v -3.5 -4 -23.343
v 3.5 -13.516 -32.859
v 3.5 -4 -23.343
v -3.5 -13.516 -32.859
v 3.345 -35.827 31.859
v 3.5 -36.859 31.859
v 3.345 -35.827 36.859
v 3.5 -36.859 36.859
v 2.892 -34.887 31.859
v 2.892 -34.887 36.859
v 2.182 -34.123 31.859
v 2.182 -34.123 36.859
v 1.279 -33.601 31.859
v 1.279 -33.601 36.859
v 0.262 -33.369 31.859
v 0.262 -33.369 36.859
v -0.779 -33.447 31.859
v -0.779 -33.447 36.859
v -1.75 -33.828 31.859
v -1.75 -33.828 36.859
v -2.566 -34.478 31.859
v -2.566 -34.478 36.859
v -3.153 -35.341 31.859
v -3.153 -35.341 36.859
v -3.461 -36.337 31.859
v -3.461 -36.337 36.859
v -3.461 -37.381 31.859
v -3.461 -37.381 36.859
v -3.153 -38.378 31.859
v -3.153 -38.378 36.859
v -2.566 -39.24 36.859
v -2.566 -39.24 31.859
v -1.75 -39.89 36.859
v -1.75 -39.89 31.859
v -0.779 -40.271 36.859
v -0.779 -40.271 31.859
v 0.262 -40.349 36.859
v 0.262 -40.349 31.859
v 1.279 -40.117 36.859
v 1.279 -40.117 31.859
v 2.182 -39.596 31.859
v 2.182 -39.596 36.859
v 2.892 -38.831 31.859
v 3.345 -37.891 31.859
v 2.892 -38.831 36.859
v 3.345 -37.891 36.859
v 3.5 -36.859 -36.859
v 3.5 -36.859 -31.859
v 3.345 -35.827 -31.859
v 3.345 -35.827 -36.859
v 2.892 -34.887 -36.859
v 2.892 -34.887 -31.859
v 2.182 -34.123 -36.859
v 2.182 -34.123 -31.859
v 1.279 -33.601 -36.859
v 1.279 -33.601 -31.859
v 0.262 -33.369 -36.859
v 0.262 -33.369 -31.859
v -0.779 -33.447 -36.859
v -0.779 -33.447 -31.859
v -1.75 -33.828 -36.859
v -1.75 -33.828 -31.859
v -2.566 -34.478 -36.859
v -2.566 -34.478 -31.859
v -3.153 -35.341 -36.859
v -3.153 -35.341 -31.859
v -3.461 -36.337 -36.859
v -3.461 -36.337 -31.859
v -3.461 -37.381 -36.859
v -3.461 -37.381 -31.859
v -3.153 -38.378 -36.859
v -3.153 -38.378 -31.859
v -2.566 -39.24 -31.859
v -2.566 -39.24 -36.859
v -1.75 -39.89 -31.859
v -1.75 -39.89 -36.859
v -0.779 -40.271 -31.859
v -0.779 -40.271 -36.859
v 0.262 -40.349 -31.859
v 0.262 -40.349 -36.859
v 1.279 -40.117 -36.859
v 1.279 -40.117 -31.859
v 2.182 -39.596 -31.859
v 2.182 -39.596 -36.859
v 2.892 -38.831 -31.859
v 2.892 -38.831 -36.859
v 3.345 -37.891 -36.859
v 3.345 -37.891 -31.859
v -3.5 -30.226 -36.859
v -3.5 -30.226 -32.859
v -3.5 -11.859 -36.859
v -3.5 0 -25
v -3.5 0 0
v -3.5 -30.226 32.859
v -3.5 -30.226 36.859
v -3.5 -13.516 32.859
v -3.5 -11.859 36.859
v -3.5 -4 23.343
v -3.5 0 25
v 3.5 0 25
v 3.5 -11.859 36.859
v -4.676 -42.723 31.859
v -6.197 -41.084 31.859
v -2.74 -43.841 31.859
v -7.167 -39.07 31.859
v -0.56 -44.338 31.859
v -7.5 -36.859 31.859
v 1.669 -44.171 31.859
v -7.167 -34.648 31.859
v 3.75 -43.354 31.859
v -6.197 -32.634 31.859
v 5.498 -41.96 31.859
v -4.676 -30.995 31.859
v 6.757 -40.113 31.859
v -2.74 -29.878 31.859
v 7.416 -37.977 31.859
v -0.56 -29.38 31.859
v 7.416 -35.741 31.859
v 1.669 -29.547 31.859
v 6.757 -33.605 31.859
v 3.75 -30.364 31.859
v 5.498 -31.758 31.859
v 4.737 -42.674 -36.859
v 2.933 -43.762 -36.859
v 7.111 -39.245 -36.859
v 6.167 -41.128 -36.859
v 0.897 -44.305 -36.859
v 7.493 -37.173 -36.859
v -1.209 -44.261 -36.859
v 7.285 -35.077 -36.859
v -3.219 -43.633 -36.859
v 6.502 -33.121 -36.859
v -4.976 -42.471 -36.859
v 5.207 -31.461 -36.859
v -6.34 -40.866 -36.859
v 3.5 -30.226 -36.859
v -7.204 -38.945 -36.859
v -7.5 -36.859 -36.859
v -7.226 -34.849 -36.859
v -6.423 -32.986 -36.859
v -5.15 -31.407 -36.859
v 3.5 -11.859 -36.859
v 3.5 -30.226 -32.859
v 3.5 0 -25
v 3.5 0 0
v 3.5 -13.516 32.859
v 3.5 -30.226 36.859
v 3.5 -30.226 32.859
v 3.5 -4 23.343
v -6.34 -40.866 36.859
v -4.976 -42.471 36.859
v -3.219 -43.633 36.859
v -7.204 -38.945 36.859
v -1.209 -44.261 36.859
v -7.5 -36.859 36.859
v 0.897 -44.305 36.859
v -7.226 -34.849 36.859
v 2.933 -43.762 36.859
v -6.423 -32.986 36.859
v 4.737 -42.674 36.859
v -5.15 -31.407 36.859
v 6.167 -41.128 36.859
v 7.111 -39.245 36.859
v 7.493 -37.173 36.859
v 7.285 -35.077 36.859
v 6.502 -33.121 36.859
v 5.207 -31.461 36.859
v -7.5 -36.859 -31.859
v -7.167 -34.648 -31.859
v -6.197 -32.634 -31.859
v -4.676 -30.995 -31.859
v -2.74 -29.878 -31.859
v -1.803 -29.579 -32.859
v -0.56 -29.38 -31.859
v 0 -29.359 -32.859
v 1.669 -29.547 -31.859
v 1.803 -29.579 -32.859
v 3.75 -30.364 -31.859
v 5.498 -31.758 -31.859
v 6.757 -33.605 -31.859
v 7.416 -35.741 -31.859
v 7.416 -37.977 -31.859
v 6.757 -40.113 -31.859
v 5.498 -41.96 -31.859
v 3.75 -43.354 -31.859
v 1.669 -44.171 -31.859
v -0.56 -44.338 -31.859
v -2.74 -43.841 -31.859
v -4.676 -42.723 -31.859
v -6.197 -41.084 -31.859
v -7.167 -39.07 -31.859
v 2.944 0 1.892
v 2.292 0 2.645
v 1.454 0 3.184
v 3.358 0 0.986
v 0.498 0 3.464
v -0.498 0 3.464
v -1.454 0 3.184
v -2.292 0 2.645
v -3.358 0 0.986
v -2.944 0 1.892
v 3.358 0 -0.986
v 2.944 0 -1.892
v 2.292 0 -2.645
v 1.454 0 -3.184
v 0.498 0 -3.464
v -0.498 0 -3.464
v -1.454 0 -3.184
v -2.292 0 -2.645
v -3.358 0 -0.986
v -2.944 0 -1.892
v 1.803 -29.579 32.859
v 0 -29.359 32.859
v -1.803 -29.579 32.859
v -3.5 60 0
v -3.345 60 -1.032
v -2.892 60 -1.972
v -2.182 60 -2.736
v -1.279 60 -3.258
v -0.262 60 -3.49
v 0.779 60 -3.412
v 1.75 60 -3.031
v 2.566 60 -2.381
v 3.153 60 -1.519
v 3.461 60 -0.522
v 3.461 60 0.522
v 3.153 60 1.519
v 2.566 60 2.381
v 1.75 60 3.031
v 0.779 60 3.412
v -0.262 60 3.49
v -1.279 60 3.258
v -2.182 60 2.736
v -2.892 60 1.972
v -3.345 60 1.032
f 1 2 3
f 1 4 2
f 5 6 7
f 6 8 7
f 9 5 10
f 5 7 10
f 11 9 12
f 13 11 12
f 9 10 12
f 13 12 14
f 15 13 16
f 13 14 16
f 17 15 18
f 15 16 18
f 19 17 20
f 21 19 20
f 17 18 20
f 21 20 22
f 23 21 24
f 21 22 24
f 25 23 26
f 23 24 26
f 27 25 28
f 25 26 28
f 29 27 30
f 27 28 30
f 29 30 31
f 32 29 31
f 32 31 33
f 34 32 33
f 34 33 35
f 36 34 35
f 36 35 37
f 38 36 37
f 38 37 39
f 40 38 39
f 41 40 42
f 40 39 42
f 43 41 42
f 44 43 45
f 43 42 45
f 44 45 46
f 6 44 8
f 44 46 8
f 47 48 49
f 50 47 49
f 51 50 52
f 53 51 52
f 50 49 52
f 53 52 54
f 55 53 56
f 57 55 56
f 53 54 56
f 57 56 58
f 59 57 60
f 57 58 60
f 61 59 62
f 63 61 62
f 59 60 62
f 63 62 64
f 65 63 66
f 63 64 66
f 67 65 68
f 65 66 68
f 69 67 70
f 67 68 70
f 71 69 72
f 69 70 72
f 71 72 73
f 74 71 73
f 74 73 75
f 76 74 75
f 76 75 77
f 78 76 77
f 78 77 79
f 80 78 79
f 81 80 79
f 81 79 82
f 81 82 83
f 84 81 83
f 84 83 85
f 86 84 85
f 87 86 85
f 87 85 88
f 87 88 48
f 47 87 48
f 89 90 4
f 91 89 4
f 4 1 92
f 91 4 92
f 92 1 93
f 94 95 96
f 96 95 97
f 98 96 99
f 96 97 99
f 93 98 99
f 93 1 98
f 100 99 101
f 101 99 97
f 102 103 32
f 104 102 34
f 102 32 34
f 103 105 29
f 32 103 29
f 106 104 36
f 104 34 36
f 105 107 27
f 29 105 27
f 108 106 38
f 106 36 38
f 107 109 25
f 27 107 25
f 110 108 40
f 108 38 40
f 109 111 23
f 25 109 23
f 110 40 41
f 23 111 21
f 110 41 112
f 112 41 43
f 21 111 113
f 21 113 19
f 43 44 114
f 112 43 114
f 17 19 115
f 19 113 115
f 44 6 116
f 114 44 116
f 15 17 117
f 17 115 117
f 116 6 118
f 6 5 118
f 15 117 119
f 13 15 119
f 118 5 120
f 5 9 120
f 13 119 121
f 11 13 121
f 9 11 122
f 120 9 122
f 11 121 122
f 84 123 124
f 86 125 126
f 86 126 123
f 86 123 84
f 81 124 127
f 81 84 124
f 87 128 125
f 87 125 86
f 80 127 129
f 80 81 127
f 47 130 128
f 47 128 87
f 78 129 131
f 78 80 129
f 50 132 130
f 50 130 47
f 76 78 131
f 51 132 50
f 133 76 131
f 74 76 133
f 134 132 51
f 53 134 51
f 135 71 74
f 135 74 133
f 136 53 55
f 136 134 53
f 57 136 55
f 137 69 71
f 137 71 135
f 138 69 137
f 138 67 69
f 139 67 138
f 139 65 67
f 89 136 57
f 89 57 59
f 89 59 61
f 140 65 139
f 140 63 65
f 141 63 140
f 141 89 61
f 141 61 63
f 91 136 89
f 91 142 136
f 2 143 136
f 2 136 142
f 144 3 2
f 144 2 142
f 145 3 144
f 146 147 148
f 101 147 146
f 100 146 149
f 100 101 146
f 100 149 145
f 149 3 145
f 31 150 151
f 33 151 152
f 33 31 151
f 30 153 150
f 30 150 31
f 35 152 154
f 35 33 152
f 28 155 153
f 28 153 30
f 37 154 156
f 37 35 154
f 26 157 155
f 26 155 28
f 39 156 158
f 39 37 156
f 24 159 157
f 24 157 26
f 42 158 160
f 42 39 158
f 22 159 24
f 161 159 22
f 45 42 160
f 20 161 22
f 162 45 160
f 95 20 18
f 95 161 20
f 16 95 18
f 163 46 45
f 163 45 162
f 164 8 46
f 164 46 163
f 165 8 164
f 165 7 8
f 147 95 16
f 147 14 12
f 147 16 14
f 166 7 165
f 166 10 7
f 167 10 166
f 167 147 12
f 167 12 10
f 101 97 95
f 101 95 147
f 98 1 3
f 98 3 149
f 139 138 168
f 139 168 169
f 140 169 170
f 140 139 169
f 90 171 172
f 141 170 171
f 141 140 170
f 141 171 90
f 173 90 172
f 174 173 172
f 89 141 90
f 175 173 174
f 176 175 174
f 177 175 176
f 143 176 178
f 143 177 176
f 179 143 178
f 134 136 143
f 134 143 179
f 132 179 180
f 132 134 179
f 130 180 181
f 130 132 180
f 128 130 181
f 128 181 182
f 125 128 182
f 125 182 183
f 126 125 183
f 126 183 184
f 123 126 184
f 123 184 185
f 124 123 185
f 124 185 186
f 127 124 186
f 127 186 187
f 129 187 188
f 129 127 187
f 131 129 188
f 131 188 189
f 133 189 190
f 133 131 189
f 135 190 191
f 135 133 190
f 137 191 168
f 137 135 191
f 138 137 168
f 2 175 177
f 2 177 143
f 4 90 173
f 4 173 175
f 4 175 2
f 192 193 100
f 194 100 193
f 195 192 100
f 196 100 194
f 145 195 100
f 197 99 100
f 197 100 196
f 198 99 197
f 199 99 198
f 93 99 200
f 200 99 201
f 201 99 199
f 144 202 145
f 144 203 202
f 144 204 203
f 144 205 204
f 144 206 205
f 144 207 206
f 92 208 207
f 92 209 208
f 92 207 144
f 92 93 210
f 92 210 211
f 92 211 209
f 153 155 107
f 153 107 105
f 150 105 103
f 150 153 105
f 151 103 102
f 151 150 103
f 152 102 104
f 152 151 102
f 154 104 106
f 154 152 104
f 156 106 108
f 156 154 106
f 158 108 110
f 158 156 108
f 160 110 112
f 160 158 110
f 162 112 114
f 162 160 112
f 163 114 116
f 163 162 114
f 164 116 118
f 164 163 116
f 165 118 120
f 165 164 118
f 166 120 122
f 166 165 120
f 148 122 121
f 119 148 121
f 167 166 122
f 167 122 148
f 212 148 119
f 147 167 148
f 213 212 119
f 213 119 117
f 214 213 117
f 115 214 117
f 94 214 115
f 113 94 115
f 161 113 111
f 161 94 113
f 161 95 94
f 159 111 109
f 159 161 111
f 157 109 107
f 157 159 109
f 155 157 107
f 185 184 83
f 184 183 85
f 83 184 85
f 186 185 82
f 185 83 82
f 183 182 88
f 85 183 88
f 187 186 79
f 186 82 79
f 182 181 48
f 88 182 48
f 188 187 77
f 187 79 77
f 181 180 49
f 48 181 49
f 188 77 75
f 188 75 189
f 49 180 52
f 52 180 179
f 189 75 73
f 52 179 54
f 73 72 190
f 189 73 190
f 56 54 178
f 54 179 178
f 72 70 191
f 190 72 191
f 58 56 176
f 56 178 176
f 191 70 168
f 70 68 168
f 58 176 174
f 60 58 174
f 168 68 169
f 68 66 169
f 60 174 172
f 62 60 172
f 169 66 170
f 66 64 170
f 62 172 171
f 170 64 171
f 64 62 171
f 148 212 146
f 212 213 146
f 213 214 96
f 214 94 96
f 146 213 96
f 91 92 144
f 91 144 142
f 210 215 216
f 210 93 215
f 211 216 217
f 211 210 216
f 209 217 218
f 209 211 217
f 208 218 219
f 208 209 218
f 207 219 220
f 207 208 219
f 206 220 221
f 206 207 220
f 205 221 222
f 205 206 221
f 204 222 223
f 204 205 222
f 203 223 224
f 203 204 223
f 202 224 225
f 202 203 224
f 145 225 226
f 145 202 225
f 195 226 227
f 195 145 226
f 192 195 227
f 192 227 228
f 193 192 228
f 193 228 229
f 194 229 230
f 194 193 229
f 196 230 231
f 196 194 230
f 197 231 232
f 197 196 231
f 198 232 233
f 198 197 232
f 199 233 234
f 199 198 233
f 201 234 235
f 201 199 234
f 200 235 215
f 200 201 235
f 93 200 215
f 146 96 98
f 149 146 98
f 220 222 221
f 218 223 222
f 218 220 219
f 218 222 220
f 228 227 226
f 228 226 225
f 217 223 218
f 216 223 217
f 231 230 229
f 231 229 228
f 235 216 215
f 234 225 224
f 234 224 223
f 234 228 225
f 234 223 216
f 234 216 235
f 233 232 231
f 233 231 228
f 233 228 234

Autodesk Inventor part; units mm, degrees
ref_plane "YZ Plane" through (0, 0, 0) normal (1, 0, 0) x (0, 1, 0)
ref_plane "XZ Plane" through (0, 0, 0) normal (0, 1, 0) x (-1, 0, 0)
ref_plane "XY Plane" through (0, 0, 0) normal (0, 0, 1) x (1, 0, 0)
sketch "Эскиз1" plane through (0, 0, 0) normal (0, 1, 0) x (-1, 0, 0)
  circle A0 centre (0, 0) radius 3.5
  dimension "d0" = 7
extrude "Выдавливание1" add sketch "Эскиз1" along normal blind 60
sketch "Эскиз3" plane through (0, 0, 0) normal (1, 0, 0) x (0, 1, 0)
  line L0 (0, 0) -> (0, -25)
  line L1 (0, -25) -> (-11.8591, -36.8591)
  line L2 (-11.8591, -36.8591) -> (-36.8591, -36.8591)
  line L3 (-36.8591, -32.8591) -> (-13.516, -32.8591)
  line L4 (-13.516, -32.8591) -> (-4, -23.3431)
  line L5 (-4, -23.3431) -> (-4, 0)
  line L6 (-36.8591, -32.8591) -> (-36.8591, -36.8591)
  line L7 (0, 0) -> (-15.7359, 0) construction
  line L8 (0, 0) -> (0, 25)
  line L9 (0, 25) -> (-11.8591, 36.8591)
  line L10 (-11.8591, 36.8591) -> (-36.8591, 36.8591)
  line L11 (-36.8591, 32.8591) -> (-13.516, 32.8591)
  line L12 (-13.516, 32.8591) -> (-4, 23.3431)
  line L13 (-4, 23.3431) -> (-4, 0)
  line L14 (-36.8591, 32.8591) -> (-36.8591, 36.8591)
  dimension "d7" = 25
  dimension "d8" = 45
  dimension "d9" = 25
  dimension "d10" = 4
extrude "Выдавливание3" add sketch "Эскиз3" along normal mid plane 7
sketch "Эскиз4" plane through (3.5, -11.8591, -36.8591) normal (0, 0, -1) x (-1, 0, 0)
  line L0 (7, -25) -> (0, -25) projected
  circle A0 centre (3.5, -25) radius 7.5
  point P0 (3.5, 11.8591)
  dimension "d13" = 15
extrude "Выдавливание4" add sketch "Эскиз4" against normal blind 5
mirror "Зеркальное отражение1" about plane through (0, 0, 0) normal (0, 0, 1) of "Выдавливание4"
sketch "Эскиз6" plane through (-3.5, -11.8591, 36.8591) normal (0, 0, 1) x (1, 0, 0)
  circle A0 centre (3.5, -25) radius 7.5 projected
  circle A1 centre (3.5, -25) radius 3.5
  point P0 (3.5, 11.8591)
  dimension "d16" = 7
extrude "Выдавливание5" cut sketch "Эскиз6" against normal through all contours A1
properties part number "Макет_рамки" material "Алюминий 6061"
